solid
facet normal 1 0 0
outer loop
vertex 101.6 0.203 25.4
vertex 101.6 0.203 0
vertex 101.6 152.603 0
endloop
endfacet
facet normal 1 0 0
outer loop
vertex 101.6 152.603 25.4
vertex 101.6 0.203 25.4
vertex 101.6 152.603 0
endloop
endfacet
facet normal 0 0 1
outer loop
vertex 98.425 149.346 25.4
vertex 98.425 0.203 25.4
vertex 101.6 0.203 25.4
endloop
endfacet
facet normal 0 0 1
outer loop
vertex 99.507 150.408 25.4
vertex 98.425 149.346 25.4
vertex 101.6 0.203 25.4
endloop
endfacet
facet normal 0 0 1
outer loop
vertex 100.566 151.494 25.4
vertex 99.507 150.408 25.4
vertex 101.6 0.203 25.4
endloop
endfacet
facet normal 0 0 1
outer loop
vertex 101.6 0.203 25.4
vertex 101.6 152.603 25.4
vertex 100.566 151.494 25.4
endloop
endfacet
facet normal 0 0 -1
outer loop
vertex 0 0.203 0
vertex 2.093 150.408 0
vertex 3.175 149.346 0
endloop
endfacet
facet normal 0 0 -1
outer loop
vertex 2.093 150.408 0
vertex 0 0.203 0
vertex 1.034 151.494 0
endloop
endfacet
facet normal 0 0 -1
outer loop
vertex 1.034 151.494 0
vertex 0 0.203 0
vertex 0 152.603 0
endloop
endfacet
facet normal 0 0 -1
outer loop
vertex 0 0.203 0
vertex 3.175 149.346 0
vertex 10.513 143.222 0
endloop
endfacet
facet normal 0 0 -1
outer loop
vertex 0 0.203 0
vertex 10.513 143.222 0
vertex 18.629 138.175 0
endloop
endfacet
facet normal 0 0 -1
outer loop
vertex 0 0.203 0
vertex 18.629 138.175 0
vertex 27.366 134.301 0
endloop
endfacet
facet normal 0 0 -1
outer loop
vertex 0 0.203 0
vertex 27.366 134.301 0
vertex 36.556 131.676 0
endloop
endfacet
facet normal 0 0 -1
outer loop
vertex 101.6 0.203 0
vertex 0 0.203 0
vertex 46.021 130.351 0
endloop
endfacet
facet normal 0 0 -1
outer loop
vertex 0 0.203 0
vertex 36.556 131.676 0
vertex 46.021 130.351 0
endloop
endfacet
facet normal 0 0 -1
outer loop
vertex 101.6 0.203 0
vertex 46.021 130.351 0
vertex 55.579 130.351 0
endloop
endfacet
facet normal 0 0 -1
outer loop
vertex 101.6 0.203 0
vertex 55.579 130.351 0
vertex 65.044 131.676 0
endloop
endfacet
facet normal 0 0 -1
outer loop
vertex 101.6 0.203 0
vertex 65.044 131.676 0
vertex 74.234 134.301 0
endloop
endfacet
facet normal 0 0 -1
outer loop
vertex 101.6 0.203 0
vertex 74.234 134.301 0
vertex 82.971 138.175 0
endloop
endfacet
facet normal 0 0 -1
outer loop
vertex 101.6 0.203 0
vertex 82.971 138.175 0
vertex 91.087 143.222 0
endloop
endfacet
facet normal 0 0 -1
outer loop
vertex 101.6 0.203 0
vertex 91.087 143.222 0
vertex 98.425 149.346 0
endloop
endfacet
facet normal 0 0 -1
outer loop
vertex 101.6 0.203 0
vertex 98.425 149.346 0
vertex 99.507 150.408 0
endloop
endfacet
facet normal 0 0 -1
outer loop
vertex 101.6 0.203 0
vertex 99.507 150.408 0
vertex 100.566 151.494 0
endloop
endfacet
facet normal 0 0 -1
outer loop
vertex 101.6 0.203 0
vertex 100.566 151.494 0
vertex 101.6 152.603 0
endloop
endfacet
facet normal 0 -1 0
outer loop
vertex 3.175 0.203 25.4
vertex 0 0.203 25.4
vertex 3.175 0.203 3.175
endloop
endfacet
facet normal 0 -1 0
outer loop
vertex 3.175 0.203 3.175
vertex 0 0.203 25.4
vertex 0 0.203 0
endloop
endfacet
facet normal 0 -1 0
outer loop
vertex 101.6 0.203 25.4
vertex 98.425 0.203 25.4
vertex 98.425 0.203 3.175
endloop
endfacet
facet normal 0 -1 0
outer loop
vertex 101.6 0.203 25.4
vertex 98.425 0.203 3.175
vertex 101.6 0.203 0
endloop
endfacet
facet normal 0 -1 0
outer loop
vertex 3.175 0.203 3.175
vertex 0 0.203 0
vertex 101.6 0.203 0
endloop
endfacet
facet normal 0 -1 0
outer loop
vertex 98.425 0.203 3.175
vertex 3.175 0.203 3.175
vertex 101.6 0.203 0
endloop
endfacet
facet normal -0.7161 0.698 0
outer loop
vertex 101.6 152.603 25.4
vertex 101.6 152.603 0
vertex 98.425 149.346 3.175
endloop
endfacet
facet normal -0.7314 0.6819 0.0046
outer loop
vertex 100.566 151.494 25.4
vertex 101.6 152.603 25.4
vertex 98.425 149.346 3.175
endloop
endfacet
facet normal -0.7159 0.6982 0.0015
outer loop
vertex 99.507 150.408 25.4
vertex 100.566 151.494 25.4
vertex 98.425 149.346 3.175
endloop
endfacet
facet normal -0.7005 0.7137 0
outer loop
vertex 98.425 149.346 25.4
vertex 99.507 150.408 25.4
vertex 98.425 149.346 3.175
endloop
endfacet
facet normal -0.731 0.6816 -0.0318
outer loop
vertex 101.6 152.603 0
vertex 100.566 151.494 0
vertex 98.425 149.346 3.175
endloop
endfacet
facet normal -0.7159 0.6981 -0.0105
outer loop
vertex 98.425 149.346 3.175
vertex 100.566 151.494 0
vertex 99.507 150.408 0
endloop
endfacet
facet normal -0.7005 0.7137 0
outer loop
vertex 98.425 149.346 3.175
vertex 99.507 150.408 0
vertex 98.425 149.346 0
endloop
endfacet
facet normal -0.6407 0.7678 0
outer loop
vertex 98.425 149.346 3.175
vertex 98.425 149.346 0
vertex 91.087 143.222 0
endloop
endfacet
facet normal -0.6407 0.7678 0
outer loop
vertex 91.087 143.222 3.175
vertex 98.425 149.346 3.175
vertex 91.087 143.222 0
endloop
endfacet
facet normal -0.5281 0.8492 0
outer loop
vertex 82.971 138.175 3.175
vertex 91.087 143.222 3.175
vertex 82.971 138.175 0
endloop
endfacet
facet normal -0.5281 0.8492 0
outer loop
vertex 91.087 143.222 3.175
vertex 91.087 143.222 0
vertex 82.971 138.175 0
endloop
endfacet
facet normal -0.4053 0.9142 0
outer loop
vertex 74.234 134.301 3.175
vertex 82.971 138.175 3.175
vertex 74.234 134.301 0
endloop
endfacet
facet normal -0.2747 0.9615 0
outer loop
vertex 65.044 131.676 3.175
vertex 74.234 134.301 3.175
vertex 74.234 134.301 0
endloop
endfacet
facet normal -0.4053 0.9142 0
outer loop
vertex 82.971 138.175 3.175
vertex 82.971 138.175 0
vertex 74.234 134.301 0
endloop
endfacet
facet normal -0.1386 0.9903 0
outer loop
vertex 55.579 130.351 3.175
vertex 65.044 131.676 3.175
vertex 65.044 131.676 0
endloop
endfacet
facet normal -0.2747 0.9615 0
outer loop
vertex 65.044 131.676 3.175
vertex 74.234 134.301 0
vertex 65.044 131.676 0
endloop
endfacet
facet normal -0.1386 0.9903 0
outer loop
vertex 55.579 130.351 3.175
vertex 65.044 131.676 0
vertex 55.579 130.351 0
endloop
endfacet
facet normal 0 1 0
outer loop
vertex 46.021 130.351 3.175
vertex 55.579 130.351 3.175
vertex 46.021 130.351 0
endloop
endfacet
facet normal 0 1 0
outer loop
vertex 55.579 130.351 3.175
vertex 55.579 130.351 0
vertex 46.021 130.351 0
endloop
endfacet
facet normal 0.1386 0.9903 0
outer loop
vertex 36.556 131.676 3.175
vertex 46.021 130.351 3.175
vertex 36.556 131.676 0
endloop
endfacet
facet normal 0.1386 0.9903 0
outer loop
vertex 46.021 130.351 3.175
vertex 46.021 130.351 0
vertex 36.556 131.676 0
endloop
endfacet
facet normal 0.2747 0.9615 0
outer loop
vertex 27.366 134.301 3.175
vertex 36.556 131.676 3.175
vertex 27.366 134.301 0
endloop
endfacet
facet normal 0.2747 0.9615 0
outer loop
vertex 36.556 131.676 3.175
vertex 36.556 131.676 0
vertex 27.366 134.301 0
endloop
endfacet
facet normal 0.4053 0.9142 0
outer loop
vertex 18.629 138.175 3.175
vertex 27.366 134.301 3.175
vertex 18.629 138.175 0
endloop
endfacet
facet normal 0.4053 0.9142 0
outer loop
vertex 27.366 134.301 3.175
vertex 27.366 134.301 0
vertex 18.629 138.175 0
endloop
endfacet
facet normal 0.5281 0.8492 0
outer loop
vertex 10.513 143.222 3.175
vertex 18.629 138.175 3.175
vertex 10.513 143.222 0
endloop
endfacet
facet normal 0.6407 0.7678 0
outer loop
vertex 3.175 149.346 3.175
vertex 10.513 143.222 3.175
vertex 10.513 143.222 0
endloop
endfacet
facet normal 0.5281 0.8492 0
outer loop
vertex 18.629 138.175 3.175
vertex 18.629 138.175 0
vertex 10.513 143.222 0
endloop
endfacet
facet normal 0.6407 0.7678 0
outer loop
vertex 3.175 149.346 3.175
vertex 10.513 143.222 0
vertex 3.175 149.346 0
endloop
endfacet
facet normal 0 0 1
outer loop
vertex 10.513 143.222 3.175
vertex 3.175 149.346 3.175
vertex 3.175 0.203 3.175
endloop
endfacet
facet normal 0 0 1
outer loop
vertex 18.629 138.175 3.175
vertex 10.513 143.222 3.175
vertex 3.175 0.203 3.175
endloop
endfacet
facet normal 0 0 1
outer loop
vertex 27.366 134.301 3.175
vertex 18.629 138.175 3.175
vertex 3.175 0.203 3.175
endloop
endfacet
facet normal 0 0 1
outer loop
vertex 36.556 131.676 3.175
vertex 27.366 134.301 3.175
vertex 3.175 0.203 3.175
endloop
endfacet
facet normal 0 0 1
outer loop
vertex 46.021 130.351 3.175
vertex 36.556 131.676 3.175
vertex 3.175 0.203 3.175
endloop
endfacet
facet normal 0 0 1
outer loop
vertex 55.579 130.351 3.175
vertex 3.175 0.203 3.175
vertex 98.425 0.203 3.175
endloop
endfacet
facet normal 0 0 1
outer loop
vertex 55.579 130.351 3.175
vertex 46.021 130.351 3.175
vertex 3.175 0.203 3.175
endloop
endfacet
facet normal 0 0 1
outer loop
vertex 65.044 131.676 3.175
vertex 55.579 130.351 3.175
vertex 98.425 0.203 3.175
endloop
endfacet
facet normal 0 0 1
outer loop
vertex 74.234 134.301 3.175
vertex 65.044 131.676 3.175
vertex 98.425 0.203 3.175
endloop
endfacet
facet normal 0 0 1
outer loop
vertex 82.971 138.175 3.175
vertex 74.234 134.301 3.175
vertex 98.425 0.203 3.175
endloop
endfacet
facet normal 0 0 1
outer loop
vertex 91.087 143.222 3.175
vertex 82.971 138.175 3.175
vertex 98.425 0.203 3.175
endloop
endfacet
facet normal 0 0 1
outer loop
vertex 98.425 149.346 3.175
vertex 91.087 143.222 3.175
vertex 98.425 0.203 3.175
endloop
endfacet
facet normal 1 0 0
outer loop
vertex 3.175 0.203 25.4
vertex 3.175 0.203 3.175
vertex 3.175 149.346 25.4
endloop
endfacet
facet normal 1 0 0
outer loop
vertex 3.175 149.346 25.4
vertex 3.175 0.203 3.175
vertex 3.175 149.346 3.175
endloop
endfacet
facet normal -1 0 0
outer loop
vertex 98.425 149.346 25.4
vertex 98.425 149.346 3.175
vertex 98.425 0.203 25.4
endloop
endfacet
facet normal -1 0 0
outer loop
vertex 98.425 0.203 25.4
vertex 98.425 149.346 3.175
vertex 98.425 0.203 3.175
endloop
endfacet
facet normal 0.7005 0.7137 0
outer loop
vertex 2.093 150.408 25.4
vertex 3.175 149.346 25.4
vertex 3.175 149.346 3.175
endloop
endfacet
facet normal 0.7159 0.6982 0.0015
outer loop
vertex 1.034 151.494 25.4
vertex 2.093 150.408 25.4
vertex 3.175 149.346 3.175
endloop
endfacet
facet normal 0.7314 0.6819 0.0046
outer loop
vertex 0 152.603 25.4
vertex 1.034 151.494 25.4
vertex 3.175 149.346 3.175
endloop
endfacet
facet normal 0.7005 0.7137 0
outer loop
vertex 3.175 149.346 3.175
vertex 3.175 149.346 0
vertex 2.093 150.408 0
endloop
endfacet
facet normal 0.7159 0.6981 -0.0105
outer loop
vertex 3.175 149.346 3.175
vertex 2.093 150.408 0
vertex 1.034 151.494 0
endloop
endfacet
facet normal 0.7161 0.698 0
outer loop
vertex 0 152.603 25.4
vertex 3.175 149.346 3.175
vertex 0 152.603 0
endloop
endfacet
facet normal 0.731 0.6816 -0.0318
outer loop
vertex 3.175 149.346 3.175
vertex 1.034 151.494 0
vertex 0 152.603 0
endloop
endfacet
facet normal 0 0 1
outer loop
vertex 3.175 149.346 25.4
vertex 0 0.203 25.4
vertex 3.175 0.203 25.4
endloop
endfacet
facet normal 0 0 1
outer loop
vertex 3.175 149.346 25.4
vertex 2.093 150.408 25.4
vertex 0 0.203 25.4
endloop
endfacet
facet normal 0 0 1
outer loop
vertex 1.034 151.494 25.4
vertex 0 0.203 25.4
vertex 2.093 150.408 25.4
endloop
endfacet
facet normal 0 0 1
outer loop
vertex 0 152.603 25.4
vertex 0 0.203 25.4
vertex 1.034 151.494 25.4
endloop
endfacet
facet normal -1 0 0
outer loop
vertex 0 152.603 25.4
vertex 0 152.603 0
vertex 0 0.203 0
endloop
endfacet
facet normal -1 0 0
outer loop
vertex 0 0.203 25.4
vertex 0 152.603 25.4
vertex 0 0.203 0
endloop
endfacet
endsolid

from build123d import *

# Parameters (mm, degrees)
F1_DEPTH = 3.175
F2_DEPTH = 25.4
F3_DEPTH = 25.4


with BuildPart() as f1:
    # F0 (on Top) → F1 (new body)
    with BuildSketch(Plane.XY):
        with BuildLine():
            ThreePointArc((98.425, 149.3462514694), (50.8, 130.1850769842), (3.175, 149.3462514694))
            Line((3.175, 149.3462514694), (3.175, 3.3780224621))
            Line((3.175, 3.3780224621), (3.175, 0.2030224621))
            Line((3.175, 0.2030224621), (98.425, 0.2030224621))
            Line((98.425, 0.2030224621), (98.425, 3.3780224621))
            Line((98.425, 3.3780224621), (98.425, 149.3462514694))
        make_face()
    extrude(amount=F1_DEPTH)

    # F0 (on Top) → F2 (join)
    with BuildSketch(Plane.XY):
        with BuildLine():
            ThreePointArc((3.175, 149.3462514694), (1.5605666607, 150.9483798686), (0, 152.6030224621))
            Line((0, 152.6030224621), (0, 0.2030224621))
            Line((0, 0.2030224621), (3.175, 0.2030224621))
            Line((3.175, 0.2030224621), (3.175, 3.3780224621))
            Line((3.175, 3.3780224621), (3.175, 149.3462514694))
        make_face()
    extrude(amount=F2_DEPTH)

    # F0 (on Top) → F3 (join)
    with BuildSketch(Plane.XY):
        with BuildLine():
            ThreePointArc((101.6, 152.6030224621), (100.0394333393, 150.9483798686), (98.425, 149.3462514694))
            Line((98.425, 149.3462514694), (98.425, 3.3780224621))
            Line((98.425, 3.3780224621), (98.425, 0.2030224621))
            Line((98.425, 0.2030224621), (101.6, 0.2030224621))
            Line((101.6, 0.2030224621), (101.6, 152.6030224621))
        make_face()
    extrude(amount=F3_DEPTH)


solid = f1.part
